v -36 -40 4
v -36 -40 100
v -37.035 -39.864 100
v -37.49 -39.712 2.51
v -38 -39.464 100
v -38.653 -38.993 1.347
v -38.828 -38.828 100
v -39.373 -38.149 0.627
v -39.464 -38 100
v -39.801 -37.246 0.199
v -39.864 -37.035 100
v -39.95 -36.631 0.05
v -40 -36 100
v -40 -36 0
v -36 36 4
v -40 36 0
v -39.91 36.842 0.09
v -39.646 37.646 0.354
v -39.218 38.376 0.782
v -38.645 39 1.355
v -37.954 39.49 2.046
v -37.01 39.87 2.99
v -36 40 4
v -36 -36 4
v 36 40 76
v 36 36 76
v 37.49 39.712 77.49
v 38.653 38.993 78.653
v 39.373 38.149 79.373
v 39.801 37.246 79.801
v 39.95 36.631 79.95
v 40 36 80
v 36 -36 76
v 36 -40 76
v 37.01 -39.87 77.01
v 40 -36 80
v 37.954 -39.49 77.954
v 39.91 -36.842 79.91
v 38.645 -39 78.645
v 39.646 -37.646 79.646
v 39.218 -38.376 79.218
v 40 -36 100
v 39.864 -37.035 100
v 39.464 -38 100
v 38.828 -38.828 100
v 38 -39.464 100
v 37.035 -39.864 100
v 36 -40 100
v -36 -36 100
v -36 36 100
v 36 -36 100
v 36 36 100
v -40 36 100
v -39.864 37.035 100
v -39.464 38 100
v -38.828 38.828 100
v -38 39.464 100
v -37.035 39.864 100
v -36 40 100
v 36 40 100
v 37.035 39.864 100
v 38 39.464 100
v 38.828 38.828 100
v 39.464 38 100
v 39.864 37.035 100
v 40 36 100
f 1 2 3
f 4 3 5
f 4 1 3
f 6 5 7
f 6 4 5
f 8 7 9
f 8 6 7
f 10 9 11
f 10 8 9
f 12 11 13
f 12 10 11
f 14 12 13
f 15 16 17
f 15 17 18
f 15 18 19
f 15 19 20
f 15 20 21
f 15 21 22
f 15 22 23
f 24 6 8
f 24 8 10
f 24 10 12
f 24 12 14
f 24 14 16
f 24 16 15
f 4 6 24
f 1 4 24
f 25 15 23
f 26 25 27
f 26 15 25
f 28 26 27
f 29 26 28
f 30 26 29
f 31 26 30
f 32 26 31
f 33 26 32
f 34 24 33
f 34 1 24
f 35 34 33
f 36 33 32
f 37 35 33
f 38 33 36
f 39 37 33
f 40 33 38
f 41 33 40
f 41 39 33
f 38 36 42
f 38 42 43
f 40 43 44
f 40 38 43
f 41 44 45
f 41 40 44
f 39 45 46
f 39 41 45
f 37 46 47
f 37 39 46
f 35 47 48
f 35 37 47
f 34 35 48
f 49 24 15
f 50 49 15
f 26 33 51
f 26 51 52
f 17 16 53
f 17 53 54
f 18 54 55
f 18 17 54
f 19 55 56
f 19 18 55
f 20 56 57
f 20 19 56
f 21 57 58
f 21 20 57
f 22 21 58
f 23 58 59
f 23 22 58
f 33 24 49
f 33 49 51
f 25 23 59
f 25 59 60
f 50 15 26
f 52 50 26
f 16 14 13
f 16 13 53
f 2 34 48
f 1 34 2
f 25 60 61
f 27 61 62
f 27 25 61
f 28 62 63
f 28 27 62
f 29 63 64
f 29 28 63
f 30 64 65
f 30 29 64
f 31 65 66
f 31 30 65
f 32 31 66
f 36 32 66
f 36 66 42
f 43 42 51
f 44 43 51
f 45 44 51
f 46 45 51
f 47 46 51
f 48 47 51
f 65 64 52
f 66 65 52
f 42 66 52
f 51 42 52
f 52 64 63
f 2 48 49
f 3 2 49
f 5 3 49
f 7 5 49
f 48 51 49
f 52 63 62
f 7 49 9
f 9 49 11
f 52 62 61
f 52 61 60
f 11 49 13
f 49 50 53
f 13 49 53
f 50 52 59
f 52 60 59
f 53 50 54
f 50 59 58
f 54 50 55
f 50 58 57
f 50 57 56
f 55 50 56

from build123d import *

# Parameters (mm, degrees)
IZIM1_W                     = 72
IZIM1_H                     = 72
Y_KSEKLIK_EKSTR_ZYON1_DEPTH = 100
KES_EKSTR_ZYON2_DEPTH       = 67
KES_EKSTR_ZYON2_DEPTH_BACK  = 90


with BuildPart() as part:
    # Çizim1 → Yükseklik-Ekstrüzyon1 (new body)
    with BuildSketch(Plane.XY):
        with BuildLine():
            Line((-36, 40), (36, 40))
            ThreePointArc((36, 40), (38.828427125, 38.828427125), (40, 36))
            Line((40, 36), (40, -36))
            ThreePointArc((40, -36), (38.828427125, -38.828427125), (36, -40))
            Line((36, -40), (-36, -40))
            ThreePointArc((-36, -40), (-38.828427125, -38.828427125), (-40, -36))
            Line((-40, -36), (-40, 36))
            ThreePointArc((-40, 36), (-38.828427125, 38.828427125), (-36, 40))
        make_face()
        Rectangle(IZIM1_W, IZIM1_H, mode=Mode.SUBTRACT)
    extrude(amount=Y_KSEKLIK_EKSTR_ZYON1_DEPTH)

    # Çizim4 → Kes-Ekstrüzyon2 (cut, two sides: drawn at the far end of the back side and taken through both)
    with BuildSketch(Plane(origin=(0, 0, 0), x_dir=(1, 0, 0), z_dir=(0, 1, 0)).offset(-KES_EKSTR_ZYON2_DEPTH_BACK)):
        Polygon((-40, 0), (40, -80), (40, 0), align=None)
    extrude(amount=KES_EKSTR_ZYON2_DEPTH + KES_EKSTR_ZYON2_DEPTH_BACK, mode=Mode.SUBTRACT)


solid = part.part
